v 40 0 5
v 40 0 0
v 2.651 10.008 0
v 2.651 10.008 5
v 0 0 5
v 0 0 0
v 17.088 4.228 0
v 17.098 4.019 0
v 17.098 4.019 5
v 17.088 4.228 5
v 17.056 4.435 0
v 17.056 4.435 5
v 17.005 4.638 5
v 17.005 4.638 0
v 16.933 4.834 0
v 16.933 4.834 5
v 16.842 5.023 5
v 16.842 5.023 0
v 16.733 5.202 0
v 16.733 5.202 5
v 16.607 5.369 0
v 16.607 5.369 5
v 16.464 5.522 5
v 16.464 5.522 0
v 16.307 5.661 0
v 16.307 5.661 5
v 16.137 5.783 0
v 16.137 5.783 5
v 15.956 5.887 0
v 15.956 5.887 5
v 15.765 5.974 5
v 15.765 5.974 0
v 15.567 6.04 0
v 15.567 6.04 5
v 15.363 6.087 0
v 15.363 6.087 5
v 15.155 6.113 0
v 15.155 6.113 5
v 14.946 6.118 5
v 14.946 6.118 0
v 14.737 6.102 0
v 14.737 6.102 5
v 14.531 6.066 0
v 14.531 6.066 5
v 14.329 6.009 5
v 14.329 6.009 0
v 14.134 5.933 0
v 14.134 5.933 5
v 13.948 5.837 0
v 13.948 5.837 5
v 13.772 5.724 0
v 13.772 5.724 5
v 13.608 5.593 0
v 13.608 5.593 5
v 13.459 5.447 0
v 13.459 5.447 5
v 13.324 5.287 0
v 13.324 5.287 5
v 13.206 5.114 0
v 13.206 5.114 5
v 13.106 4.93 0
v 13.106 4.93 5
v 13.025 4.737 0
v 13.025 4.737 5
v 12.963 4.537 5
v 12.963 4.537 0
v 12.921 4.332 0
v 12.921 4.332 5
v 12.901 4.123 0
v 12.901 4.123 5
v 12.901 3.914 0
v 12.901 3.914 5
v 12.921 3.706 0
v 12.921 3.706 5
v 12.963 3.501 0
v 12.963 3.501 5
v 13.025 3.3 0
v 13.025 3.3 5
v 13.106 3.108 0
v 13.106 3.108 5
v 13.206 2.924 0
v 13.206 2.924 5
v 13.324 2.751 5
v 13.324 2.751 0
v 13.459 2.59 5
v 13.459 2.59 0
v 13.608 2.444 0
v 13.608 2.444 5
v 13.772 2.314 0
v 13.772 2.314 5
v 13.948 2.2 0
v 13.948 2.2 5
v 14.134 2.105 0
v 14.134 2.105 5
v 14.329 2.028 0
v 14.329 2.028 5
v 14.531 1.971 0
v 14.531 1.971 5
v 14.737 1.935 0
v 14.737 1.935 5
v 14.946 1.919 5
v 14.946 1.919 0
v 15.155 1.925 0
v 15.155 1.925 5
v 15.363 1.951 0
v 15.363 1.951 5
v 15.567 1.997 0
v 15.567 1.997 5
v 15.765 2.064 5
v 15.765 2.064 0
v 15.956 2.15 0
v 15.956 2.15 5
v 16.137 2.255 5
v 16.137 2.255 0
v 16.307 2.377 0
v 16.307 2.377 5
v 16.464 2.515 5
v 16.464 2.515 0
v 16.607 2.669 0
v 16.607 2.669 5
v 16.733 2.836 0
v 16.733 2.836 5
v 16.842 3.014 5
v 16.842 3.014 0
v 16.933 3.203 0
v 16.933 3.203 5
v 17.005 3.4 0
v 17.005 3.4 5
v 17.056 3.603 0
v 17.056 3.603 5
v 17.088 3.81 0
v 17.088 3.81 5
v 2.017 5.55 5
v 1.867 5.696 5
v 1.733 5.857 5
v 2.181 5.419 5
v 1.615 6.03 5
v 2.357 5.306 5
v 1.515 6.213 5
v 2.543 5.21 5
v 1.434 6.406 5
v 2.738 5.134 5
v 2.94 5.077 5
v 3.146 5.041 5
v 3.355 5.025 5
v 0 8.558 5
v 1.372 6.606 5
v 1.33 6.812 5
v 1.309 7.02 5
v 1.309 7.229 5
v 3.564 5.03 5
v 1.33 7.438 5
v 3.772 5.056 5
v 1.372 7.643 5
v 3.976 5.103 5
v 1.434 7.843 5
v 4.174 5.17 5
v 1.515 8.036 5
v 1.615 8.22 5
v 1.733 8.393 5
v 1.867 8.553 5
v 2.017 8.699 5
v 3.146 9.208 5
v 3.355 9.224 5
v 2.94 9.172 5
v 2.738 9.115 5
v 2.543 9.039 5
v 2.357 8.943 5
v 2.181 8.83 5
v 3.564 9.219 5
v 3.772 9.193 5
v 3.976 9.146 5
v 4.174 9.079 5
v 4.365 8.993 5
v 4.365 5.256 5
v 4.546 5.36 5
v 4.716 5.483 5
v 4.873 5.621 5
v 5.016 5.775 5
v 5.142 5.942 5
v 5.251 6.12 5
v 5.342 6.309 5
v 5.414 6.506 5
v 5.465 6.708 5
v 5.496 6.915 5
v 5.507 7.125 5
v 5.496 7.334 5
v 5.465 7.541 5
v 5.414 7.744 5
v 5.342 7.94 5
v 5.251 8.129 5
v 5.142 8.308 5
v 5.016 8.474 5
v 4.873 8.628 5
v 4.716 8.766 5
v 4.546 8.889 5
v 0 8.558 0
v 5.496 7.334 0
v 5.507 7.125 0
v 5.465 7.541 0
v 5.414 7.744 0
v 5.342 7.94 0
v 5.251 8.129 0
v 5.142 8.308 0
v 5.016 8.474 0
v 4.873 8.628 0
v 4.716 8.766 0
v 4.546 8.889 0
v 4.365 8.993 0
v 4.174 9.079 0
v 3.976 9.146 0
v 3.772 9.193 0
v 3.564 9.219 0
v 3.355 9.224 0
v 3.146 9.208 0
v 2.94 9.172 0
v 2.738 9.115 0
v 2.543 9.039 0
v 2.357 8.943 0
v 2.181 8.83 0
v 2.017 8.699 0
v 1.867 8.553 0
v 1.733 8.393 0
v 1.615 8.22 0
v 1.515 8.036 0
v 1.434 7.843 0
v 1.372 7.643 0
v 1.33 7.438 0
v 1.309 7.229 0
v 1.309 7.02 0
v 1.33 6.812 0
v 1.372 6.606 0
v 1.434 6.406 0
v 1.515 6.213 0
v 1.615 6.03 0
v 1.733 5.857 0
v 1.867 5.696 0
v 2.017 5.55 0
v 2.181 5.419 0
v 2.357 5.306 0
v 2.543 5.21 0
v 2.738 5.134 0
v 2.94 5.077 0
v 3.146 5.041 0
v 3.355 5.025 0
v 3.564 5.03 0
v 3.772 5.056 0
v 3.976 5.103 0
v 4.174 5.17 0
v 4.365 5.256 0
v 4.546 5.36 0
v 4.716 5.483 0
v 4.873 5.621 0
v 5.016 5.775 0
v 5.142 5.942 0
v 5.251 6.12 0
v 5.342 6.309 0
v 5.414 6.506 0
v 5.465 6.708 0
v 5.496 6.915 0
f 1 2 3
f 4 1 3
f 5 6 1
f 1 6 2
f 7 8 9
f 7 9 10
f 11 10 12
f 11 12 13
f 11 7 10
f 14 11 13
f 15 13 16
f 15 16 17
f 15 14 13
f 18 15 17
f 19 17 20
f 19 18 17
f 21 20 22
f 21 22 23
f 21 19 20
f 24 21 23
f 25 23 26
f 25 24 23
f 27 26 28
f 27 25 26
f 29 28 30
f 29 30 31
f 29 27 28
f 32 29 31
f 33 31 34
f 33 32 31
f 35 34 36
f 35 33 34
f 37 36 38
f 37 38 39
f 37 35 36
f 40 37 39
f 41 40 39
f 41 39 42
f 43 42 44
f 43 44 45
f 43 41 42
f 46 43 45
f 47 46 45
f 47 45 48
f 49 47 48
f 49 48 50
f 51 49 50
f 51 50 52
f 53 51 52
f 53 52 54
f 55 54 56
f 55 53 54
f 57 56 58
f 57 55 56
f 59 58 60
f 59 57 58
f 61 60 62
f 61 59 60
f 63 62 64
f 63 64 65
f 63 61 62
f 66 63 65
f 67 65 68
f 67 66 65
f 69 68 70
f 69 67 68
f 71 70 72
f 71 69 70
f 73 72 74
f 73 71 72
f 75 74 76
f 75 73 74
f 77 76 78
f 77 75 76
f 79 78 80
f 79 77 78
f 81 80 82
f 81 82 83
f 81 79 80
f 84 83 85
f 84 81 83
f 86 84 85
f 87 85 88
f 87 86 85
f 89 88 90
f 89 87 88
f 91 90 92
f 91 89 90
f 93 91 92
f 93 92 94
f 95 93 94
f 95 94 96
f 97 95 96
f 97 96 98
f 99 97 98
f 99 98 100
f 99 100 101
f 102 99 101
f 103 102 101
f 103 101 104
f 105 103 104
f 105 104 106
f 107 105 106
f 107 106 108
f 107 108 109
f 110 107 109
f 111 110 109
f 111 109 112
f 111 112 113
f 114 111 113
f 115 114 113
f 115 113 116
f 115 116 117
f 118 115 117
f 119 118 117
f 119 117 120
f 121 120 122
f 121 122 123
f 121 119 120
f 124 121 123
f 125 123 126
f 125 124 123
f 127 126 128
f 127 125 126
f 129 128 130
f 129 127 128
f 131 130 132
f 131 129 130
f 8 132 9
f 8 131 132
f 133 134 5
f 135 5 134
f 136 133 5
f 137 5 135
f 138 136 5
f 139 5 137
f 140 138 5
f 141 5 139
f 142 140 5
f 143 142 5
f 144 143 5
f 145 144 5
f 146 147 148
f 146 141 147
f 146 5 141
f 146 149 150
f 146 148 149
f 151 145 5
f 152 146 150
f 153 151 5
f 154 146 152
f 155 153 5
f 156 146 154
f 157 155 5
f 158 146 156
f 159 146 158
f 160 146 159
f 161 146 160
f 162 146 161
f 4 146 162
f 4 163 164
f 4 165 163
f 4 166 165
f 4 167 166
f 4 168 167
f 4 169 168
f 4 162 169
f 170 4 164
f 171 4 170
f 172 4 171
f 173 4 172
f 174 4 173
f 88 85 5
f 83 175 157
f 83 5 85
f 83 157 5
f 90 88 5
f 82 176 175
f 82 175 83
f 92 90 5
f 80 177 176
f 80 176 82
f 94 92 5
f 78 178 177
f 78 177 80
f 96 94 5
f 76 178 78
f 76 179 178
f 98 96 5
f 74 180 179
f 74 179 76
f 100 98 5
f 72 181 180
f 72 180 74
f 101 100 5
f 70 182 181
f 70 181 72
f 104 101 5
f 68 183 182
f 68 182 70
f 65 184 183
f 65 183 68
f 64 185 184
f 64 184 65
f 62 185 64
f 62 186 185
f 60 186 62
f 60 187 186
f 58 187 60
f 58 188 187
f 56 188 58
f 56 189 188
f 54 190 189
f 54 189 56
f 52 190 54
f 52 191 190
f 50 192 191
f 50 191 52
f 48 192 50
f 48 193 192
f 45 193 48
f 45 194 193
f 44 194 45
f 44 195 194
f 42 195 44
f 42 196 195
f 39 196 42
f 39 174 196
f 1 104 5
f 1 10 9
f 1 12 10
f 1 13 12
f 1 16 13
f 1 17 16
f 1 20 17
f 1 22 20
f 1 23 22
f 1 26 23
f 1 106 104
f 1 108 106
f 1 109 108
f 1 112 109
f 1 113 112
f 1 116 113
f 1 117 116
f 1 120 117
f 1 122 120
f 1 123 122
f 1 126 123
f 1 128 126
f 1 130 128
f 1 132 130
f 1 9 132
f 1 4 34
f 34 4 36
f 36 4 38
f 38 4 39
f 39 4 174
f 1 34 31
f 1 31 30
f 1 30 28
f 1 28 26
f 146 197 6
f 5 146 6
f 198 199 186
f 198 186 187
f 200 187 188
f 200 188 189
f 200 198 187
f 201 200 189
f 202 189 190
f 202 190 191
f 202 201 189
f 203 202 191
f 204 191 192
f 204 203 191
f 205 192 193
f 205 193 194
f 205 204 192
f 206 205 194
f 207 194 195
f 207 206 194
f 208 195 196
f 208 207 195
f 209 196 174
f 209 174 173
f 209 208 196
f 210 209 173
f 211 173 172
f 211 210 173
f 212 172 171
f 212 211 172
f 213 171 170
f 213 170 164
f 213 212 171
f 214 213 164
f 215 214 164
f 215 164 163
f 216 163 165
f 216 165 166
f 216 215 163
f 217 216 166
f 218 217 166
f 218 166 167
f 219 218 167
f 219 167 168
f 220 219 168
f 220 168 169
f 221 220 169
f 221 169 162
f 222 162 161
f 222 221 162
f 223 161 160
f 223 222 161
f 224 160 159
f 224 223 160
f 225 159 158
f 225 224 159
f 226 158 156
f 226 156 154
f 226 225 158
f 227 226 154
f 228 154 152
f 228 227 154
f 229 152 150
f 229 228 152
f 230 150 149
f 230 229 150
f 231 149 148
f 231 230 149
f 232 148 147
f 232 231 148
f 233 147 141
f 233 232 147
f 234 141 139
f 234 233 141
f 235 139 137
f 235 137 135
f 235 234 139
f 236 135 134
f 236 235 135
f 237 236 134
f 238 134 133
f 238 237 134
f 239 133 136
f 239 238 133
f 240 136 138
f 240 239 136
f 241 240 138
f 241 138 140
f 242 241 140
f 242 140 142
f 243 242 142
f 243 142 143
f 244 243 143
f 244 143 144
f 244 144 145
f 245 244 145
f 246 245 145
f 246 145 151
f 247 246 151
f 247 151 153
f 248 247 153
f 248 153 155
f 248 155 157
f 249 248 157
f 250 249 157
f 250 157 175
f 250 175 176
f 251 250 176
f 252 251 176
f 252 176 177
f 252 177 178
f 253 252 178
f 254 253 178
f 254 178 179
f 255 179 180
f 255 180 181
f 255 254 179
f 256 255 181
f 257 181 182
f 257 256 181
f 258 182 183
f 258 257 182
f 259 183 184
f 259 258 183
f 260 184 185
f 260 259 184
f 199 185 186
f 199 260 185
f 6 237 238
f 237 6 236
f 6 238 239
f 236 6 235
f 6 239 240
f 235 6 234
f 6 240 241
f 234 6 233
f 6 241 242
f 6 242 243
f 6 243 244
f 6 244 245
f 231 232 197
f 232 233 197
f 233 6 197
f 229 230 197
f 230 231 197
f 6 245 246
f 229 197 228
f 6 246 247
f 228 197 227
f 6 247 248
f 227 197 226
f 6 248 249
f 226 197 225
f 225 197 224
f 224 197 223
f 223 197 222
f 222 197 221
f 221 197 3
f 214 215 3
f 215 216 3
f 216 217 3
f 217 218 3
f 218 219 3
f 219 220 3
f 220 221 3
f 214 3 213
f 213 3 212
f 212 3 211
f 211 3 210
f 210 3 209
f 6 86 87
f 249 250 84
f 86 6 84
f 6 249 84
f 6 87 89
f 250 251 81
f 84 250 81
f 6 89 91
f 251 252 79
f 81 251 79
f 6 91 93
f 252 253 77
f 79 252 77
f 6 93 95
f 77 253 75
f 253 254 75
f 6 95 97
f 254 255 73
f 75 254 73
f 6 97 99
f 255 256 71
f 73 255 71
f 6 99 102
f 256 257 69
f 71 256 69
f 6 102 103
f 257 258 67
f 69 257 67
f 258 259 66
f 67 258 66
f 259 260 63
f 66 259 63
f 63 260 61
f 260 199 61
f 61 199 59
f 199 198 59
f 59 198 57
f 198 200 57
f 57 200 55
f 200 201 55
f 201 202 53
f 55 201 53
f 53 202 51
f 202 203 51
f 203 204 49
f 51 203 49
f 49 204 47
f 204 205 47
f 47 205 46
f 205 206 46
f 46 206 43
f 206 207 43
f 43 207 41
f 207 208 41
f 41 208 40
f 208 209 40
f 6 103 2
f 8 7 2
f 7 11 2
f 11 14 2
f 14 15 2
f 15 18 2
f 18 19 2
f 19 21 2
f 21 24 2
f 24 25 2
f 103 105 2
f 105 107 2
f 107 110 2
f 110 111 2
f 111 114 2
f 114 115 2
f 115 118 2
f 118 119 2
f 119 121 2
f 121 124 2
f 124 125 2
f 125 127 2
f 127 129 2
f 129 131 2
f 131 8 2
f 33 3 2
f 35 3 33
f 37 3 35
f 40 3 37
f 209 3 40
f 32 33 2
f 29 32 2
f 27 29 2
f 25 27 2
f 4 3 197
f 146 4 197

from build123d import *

# Parameters (mm, degrees)
SKETCH_8_R      = 2.1
EXTRUDE_6_DEPTH = 5


with BuildPart() as part:
    # 草图8 → 凸台-拉伸6 (new body)
    with BuildSketch(Plane.XY):
        Polygon((0, 0), (40, 0), (2.651084003, 10.00761403), (0, 8.558252816), align=None)
        with Locations((3.406885567, 7.12453076)):
            Circle(SKETCH_8_R, mode=Mode.SUBTRACT)
        with Locations((14.997995315, 4.018701596)):
            Circle(SKETCH_8_R, mode=Mode.SUBTRACT)
    extrude(amount=EXTRUDE_6_DEPTH)


solid = part.part
